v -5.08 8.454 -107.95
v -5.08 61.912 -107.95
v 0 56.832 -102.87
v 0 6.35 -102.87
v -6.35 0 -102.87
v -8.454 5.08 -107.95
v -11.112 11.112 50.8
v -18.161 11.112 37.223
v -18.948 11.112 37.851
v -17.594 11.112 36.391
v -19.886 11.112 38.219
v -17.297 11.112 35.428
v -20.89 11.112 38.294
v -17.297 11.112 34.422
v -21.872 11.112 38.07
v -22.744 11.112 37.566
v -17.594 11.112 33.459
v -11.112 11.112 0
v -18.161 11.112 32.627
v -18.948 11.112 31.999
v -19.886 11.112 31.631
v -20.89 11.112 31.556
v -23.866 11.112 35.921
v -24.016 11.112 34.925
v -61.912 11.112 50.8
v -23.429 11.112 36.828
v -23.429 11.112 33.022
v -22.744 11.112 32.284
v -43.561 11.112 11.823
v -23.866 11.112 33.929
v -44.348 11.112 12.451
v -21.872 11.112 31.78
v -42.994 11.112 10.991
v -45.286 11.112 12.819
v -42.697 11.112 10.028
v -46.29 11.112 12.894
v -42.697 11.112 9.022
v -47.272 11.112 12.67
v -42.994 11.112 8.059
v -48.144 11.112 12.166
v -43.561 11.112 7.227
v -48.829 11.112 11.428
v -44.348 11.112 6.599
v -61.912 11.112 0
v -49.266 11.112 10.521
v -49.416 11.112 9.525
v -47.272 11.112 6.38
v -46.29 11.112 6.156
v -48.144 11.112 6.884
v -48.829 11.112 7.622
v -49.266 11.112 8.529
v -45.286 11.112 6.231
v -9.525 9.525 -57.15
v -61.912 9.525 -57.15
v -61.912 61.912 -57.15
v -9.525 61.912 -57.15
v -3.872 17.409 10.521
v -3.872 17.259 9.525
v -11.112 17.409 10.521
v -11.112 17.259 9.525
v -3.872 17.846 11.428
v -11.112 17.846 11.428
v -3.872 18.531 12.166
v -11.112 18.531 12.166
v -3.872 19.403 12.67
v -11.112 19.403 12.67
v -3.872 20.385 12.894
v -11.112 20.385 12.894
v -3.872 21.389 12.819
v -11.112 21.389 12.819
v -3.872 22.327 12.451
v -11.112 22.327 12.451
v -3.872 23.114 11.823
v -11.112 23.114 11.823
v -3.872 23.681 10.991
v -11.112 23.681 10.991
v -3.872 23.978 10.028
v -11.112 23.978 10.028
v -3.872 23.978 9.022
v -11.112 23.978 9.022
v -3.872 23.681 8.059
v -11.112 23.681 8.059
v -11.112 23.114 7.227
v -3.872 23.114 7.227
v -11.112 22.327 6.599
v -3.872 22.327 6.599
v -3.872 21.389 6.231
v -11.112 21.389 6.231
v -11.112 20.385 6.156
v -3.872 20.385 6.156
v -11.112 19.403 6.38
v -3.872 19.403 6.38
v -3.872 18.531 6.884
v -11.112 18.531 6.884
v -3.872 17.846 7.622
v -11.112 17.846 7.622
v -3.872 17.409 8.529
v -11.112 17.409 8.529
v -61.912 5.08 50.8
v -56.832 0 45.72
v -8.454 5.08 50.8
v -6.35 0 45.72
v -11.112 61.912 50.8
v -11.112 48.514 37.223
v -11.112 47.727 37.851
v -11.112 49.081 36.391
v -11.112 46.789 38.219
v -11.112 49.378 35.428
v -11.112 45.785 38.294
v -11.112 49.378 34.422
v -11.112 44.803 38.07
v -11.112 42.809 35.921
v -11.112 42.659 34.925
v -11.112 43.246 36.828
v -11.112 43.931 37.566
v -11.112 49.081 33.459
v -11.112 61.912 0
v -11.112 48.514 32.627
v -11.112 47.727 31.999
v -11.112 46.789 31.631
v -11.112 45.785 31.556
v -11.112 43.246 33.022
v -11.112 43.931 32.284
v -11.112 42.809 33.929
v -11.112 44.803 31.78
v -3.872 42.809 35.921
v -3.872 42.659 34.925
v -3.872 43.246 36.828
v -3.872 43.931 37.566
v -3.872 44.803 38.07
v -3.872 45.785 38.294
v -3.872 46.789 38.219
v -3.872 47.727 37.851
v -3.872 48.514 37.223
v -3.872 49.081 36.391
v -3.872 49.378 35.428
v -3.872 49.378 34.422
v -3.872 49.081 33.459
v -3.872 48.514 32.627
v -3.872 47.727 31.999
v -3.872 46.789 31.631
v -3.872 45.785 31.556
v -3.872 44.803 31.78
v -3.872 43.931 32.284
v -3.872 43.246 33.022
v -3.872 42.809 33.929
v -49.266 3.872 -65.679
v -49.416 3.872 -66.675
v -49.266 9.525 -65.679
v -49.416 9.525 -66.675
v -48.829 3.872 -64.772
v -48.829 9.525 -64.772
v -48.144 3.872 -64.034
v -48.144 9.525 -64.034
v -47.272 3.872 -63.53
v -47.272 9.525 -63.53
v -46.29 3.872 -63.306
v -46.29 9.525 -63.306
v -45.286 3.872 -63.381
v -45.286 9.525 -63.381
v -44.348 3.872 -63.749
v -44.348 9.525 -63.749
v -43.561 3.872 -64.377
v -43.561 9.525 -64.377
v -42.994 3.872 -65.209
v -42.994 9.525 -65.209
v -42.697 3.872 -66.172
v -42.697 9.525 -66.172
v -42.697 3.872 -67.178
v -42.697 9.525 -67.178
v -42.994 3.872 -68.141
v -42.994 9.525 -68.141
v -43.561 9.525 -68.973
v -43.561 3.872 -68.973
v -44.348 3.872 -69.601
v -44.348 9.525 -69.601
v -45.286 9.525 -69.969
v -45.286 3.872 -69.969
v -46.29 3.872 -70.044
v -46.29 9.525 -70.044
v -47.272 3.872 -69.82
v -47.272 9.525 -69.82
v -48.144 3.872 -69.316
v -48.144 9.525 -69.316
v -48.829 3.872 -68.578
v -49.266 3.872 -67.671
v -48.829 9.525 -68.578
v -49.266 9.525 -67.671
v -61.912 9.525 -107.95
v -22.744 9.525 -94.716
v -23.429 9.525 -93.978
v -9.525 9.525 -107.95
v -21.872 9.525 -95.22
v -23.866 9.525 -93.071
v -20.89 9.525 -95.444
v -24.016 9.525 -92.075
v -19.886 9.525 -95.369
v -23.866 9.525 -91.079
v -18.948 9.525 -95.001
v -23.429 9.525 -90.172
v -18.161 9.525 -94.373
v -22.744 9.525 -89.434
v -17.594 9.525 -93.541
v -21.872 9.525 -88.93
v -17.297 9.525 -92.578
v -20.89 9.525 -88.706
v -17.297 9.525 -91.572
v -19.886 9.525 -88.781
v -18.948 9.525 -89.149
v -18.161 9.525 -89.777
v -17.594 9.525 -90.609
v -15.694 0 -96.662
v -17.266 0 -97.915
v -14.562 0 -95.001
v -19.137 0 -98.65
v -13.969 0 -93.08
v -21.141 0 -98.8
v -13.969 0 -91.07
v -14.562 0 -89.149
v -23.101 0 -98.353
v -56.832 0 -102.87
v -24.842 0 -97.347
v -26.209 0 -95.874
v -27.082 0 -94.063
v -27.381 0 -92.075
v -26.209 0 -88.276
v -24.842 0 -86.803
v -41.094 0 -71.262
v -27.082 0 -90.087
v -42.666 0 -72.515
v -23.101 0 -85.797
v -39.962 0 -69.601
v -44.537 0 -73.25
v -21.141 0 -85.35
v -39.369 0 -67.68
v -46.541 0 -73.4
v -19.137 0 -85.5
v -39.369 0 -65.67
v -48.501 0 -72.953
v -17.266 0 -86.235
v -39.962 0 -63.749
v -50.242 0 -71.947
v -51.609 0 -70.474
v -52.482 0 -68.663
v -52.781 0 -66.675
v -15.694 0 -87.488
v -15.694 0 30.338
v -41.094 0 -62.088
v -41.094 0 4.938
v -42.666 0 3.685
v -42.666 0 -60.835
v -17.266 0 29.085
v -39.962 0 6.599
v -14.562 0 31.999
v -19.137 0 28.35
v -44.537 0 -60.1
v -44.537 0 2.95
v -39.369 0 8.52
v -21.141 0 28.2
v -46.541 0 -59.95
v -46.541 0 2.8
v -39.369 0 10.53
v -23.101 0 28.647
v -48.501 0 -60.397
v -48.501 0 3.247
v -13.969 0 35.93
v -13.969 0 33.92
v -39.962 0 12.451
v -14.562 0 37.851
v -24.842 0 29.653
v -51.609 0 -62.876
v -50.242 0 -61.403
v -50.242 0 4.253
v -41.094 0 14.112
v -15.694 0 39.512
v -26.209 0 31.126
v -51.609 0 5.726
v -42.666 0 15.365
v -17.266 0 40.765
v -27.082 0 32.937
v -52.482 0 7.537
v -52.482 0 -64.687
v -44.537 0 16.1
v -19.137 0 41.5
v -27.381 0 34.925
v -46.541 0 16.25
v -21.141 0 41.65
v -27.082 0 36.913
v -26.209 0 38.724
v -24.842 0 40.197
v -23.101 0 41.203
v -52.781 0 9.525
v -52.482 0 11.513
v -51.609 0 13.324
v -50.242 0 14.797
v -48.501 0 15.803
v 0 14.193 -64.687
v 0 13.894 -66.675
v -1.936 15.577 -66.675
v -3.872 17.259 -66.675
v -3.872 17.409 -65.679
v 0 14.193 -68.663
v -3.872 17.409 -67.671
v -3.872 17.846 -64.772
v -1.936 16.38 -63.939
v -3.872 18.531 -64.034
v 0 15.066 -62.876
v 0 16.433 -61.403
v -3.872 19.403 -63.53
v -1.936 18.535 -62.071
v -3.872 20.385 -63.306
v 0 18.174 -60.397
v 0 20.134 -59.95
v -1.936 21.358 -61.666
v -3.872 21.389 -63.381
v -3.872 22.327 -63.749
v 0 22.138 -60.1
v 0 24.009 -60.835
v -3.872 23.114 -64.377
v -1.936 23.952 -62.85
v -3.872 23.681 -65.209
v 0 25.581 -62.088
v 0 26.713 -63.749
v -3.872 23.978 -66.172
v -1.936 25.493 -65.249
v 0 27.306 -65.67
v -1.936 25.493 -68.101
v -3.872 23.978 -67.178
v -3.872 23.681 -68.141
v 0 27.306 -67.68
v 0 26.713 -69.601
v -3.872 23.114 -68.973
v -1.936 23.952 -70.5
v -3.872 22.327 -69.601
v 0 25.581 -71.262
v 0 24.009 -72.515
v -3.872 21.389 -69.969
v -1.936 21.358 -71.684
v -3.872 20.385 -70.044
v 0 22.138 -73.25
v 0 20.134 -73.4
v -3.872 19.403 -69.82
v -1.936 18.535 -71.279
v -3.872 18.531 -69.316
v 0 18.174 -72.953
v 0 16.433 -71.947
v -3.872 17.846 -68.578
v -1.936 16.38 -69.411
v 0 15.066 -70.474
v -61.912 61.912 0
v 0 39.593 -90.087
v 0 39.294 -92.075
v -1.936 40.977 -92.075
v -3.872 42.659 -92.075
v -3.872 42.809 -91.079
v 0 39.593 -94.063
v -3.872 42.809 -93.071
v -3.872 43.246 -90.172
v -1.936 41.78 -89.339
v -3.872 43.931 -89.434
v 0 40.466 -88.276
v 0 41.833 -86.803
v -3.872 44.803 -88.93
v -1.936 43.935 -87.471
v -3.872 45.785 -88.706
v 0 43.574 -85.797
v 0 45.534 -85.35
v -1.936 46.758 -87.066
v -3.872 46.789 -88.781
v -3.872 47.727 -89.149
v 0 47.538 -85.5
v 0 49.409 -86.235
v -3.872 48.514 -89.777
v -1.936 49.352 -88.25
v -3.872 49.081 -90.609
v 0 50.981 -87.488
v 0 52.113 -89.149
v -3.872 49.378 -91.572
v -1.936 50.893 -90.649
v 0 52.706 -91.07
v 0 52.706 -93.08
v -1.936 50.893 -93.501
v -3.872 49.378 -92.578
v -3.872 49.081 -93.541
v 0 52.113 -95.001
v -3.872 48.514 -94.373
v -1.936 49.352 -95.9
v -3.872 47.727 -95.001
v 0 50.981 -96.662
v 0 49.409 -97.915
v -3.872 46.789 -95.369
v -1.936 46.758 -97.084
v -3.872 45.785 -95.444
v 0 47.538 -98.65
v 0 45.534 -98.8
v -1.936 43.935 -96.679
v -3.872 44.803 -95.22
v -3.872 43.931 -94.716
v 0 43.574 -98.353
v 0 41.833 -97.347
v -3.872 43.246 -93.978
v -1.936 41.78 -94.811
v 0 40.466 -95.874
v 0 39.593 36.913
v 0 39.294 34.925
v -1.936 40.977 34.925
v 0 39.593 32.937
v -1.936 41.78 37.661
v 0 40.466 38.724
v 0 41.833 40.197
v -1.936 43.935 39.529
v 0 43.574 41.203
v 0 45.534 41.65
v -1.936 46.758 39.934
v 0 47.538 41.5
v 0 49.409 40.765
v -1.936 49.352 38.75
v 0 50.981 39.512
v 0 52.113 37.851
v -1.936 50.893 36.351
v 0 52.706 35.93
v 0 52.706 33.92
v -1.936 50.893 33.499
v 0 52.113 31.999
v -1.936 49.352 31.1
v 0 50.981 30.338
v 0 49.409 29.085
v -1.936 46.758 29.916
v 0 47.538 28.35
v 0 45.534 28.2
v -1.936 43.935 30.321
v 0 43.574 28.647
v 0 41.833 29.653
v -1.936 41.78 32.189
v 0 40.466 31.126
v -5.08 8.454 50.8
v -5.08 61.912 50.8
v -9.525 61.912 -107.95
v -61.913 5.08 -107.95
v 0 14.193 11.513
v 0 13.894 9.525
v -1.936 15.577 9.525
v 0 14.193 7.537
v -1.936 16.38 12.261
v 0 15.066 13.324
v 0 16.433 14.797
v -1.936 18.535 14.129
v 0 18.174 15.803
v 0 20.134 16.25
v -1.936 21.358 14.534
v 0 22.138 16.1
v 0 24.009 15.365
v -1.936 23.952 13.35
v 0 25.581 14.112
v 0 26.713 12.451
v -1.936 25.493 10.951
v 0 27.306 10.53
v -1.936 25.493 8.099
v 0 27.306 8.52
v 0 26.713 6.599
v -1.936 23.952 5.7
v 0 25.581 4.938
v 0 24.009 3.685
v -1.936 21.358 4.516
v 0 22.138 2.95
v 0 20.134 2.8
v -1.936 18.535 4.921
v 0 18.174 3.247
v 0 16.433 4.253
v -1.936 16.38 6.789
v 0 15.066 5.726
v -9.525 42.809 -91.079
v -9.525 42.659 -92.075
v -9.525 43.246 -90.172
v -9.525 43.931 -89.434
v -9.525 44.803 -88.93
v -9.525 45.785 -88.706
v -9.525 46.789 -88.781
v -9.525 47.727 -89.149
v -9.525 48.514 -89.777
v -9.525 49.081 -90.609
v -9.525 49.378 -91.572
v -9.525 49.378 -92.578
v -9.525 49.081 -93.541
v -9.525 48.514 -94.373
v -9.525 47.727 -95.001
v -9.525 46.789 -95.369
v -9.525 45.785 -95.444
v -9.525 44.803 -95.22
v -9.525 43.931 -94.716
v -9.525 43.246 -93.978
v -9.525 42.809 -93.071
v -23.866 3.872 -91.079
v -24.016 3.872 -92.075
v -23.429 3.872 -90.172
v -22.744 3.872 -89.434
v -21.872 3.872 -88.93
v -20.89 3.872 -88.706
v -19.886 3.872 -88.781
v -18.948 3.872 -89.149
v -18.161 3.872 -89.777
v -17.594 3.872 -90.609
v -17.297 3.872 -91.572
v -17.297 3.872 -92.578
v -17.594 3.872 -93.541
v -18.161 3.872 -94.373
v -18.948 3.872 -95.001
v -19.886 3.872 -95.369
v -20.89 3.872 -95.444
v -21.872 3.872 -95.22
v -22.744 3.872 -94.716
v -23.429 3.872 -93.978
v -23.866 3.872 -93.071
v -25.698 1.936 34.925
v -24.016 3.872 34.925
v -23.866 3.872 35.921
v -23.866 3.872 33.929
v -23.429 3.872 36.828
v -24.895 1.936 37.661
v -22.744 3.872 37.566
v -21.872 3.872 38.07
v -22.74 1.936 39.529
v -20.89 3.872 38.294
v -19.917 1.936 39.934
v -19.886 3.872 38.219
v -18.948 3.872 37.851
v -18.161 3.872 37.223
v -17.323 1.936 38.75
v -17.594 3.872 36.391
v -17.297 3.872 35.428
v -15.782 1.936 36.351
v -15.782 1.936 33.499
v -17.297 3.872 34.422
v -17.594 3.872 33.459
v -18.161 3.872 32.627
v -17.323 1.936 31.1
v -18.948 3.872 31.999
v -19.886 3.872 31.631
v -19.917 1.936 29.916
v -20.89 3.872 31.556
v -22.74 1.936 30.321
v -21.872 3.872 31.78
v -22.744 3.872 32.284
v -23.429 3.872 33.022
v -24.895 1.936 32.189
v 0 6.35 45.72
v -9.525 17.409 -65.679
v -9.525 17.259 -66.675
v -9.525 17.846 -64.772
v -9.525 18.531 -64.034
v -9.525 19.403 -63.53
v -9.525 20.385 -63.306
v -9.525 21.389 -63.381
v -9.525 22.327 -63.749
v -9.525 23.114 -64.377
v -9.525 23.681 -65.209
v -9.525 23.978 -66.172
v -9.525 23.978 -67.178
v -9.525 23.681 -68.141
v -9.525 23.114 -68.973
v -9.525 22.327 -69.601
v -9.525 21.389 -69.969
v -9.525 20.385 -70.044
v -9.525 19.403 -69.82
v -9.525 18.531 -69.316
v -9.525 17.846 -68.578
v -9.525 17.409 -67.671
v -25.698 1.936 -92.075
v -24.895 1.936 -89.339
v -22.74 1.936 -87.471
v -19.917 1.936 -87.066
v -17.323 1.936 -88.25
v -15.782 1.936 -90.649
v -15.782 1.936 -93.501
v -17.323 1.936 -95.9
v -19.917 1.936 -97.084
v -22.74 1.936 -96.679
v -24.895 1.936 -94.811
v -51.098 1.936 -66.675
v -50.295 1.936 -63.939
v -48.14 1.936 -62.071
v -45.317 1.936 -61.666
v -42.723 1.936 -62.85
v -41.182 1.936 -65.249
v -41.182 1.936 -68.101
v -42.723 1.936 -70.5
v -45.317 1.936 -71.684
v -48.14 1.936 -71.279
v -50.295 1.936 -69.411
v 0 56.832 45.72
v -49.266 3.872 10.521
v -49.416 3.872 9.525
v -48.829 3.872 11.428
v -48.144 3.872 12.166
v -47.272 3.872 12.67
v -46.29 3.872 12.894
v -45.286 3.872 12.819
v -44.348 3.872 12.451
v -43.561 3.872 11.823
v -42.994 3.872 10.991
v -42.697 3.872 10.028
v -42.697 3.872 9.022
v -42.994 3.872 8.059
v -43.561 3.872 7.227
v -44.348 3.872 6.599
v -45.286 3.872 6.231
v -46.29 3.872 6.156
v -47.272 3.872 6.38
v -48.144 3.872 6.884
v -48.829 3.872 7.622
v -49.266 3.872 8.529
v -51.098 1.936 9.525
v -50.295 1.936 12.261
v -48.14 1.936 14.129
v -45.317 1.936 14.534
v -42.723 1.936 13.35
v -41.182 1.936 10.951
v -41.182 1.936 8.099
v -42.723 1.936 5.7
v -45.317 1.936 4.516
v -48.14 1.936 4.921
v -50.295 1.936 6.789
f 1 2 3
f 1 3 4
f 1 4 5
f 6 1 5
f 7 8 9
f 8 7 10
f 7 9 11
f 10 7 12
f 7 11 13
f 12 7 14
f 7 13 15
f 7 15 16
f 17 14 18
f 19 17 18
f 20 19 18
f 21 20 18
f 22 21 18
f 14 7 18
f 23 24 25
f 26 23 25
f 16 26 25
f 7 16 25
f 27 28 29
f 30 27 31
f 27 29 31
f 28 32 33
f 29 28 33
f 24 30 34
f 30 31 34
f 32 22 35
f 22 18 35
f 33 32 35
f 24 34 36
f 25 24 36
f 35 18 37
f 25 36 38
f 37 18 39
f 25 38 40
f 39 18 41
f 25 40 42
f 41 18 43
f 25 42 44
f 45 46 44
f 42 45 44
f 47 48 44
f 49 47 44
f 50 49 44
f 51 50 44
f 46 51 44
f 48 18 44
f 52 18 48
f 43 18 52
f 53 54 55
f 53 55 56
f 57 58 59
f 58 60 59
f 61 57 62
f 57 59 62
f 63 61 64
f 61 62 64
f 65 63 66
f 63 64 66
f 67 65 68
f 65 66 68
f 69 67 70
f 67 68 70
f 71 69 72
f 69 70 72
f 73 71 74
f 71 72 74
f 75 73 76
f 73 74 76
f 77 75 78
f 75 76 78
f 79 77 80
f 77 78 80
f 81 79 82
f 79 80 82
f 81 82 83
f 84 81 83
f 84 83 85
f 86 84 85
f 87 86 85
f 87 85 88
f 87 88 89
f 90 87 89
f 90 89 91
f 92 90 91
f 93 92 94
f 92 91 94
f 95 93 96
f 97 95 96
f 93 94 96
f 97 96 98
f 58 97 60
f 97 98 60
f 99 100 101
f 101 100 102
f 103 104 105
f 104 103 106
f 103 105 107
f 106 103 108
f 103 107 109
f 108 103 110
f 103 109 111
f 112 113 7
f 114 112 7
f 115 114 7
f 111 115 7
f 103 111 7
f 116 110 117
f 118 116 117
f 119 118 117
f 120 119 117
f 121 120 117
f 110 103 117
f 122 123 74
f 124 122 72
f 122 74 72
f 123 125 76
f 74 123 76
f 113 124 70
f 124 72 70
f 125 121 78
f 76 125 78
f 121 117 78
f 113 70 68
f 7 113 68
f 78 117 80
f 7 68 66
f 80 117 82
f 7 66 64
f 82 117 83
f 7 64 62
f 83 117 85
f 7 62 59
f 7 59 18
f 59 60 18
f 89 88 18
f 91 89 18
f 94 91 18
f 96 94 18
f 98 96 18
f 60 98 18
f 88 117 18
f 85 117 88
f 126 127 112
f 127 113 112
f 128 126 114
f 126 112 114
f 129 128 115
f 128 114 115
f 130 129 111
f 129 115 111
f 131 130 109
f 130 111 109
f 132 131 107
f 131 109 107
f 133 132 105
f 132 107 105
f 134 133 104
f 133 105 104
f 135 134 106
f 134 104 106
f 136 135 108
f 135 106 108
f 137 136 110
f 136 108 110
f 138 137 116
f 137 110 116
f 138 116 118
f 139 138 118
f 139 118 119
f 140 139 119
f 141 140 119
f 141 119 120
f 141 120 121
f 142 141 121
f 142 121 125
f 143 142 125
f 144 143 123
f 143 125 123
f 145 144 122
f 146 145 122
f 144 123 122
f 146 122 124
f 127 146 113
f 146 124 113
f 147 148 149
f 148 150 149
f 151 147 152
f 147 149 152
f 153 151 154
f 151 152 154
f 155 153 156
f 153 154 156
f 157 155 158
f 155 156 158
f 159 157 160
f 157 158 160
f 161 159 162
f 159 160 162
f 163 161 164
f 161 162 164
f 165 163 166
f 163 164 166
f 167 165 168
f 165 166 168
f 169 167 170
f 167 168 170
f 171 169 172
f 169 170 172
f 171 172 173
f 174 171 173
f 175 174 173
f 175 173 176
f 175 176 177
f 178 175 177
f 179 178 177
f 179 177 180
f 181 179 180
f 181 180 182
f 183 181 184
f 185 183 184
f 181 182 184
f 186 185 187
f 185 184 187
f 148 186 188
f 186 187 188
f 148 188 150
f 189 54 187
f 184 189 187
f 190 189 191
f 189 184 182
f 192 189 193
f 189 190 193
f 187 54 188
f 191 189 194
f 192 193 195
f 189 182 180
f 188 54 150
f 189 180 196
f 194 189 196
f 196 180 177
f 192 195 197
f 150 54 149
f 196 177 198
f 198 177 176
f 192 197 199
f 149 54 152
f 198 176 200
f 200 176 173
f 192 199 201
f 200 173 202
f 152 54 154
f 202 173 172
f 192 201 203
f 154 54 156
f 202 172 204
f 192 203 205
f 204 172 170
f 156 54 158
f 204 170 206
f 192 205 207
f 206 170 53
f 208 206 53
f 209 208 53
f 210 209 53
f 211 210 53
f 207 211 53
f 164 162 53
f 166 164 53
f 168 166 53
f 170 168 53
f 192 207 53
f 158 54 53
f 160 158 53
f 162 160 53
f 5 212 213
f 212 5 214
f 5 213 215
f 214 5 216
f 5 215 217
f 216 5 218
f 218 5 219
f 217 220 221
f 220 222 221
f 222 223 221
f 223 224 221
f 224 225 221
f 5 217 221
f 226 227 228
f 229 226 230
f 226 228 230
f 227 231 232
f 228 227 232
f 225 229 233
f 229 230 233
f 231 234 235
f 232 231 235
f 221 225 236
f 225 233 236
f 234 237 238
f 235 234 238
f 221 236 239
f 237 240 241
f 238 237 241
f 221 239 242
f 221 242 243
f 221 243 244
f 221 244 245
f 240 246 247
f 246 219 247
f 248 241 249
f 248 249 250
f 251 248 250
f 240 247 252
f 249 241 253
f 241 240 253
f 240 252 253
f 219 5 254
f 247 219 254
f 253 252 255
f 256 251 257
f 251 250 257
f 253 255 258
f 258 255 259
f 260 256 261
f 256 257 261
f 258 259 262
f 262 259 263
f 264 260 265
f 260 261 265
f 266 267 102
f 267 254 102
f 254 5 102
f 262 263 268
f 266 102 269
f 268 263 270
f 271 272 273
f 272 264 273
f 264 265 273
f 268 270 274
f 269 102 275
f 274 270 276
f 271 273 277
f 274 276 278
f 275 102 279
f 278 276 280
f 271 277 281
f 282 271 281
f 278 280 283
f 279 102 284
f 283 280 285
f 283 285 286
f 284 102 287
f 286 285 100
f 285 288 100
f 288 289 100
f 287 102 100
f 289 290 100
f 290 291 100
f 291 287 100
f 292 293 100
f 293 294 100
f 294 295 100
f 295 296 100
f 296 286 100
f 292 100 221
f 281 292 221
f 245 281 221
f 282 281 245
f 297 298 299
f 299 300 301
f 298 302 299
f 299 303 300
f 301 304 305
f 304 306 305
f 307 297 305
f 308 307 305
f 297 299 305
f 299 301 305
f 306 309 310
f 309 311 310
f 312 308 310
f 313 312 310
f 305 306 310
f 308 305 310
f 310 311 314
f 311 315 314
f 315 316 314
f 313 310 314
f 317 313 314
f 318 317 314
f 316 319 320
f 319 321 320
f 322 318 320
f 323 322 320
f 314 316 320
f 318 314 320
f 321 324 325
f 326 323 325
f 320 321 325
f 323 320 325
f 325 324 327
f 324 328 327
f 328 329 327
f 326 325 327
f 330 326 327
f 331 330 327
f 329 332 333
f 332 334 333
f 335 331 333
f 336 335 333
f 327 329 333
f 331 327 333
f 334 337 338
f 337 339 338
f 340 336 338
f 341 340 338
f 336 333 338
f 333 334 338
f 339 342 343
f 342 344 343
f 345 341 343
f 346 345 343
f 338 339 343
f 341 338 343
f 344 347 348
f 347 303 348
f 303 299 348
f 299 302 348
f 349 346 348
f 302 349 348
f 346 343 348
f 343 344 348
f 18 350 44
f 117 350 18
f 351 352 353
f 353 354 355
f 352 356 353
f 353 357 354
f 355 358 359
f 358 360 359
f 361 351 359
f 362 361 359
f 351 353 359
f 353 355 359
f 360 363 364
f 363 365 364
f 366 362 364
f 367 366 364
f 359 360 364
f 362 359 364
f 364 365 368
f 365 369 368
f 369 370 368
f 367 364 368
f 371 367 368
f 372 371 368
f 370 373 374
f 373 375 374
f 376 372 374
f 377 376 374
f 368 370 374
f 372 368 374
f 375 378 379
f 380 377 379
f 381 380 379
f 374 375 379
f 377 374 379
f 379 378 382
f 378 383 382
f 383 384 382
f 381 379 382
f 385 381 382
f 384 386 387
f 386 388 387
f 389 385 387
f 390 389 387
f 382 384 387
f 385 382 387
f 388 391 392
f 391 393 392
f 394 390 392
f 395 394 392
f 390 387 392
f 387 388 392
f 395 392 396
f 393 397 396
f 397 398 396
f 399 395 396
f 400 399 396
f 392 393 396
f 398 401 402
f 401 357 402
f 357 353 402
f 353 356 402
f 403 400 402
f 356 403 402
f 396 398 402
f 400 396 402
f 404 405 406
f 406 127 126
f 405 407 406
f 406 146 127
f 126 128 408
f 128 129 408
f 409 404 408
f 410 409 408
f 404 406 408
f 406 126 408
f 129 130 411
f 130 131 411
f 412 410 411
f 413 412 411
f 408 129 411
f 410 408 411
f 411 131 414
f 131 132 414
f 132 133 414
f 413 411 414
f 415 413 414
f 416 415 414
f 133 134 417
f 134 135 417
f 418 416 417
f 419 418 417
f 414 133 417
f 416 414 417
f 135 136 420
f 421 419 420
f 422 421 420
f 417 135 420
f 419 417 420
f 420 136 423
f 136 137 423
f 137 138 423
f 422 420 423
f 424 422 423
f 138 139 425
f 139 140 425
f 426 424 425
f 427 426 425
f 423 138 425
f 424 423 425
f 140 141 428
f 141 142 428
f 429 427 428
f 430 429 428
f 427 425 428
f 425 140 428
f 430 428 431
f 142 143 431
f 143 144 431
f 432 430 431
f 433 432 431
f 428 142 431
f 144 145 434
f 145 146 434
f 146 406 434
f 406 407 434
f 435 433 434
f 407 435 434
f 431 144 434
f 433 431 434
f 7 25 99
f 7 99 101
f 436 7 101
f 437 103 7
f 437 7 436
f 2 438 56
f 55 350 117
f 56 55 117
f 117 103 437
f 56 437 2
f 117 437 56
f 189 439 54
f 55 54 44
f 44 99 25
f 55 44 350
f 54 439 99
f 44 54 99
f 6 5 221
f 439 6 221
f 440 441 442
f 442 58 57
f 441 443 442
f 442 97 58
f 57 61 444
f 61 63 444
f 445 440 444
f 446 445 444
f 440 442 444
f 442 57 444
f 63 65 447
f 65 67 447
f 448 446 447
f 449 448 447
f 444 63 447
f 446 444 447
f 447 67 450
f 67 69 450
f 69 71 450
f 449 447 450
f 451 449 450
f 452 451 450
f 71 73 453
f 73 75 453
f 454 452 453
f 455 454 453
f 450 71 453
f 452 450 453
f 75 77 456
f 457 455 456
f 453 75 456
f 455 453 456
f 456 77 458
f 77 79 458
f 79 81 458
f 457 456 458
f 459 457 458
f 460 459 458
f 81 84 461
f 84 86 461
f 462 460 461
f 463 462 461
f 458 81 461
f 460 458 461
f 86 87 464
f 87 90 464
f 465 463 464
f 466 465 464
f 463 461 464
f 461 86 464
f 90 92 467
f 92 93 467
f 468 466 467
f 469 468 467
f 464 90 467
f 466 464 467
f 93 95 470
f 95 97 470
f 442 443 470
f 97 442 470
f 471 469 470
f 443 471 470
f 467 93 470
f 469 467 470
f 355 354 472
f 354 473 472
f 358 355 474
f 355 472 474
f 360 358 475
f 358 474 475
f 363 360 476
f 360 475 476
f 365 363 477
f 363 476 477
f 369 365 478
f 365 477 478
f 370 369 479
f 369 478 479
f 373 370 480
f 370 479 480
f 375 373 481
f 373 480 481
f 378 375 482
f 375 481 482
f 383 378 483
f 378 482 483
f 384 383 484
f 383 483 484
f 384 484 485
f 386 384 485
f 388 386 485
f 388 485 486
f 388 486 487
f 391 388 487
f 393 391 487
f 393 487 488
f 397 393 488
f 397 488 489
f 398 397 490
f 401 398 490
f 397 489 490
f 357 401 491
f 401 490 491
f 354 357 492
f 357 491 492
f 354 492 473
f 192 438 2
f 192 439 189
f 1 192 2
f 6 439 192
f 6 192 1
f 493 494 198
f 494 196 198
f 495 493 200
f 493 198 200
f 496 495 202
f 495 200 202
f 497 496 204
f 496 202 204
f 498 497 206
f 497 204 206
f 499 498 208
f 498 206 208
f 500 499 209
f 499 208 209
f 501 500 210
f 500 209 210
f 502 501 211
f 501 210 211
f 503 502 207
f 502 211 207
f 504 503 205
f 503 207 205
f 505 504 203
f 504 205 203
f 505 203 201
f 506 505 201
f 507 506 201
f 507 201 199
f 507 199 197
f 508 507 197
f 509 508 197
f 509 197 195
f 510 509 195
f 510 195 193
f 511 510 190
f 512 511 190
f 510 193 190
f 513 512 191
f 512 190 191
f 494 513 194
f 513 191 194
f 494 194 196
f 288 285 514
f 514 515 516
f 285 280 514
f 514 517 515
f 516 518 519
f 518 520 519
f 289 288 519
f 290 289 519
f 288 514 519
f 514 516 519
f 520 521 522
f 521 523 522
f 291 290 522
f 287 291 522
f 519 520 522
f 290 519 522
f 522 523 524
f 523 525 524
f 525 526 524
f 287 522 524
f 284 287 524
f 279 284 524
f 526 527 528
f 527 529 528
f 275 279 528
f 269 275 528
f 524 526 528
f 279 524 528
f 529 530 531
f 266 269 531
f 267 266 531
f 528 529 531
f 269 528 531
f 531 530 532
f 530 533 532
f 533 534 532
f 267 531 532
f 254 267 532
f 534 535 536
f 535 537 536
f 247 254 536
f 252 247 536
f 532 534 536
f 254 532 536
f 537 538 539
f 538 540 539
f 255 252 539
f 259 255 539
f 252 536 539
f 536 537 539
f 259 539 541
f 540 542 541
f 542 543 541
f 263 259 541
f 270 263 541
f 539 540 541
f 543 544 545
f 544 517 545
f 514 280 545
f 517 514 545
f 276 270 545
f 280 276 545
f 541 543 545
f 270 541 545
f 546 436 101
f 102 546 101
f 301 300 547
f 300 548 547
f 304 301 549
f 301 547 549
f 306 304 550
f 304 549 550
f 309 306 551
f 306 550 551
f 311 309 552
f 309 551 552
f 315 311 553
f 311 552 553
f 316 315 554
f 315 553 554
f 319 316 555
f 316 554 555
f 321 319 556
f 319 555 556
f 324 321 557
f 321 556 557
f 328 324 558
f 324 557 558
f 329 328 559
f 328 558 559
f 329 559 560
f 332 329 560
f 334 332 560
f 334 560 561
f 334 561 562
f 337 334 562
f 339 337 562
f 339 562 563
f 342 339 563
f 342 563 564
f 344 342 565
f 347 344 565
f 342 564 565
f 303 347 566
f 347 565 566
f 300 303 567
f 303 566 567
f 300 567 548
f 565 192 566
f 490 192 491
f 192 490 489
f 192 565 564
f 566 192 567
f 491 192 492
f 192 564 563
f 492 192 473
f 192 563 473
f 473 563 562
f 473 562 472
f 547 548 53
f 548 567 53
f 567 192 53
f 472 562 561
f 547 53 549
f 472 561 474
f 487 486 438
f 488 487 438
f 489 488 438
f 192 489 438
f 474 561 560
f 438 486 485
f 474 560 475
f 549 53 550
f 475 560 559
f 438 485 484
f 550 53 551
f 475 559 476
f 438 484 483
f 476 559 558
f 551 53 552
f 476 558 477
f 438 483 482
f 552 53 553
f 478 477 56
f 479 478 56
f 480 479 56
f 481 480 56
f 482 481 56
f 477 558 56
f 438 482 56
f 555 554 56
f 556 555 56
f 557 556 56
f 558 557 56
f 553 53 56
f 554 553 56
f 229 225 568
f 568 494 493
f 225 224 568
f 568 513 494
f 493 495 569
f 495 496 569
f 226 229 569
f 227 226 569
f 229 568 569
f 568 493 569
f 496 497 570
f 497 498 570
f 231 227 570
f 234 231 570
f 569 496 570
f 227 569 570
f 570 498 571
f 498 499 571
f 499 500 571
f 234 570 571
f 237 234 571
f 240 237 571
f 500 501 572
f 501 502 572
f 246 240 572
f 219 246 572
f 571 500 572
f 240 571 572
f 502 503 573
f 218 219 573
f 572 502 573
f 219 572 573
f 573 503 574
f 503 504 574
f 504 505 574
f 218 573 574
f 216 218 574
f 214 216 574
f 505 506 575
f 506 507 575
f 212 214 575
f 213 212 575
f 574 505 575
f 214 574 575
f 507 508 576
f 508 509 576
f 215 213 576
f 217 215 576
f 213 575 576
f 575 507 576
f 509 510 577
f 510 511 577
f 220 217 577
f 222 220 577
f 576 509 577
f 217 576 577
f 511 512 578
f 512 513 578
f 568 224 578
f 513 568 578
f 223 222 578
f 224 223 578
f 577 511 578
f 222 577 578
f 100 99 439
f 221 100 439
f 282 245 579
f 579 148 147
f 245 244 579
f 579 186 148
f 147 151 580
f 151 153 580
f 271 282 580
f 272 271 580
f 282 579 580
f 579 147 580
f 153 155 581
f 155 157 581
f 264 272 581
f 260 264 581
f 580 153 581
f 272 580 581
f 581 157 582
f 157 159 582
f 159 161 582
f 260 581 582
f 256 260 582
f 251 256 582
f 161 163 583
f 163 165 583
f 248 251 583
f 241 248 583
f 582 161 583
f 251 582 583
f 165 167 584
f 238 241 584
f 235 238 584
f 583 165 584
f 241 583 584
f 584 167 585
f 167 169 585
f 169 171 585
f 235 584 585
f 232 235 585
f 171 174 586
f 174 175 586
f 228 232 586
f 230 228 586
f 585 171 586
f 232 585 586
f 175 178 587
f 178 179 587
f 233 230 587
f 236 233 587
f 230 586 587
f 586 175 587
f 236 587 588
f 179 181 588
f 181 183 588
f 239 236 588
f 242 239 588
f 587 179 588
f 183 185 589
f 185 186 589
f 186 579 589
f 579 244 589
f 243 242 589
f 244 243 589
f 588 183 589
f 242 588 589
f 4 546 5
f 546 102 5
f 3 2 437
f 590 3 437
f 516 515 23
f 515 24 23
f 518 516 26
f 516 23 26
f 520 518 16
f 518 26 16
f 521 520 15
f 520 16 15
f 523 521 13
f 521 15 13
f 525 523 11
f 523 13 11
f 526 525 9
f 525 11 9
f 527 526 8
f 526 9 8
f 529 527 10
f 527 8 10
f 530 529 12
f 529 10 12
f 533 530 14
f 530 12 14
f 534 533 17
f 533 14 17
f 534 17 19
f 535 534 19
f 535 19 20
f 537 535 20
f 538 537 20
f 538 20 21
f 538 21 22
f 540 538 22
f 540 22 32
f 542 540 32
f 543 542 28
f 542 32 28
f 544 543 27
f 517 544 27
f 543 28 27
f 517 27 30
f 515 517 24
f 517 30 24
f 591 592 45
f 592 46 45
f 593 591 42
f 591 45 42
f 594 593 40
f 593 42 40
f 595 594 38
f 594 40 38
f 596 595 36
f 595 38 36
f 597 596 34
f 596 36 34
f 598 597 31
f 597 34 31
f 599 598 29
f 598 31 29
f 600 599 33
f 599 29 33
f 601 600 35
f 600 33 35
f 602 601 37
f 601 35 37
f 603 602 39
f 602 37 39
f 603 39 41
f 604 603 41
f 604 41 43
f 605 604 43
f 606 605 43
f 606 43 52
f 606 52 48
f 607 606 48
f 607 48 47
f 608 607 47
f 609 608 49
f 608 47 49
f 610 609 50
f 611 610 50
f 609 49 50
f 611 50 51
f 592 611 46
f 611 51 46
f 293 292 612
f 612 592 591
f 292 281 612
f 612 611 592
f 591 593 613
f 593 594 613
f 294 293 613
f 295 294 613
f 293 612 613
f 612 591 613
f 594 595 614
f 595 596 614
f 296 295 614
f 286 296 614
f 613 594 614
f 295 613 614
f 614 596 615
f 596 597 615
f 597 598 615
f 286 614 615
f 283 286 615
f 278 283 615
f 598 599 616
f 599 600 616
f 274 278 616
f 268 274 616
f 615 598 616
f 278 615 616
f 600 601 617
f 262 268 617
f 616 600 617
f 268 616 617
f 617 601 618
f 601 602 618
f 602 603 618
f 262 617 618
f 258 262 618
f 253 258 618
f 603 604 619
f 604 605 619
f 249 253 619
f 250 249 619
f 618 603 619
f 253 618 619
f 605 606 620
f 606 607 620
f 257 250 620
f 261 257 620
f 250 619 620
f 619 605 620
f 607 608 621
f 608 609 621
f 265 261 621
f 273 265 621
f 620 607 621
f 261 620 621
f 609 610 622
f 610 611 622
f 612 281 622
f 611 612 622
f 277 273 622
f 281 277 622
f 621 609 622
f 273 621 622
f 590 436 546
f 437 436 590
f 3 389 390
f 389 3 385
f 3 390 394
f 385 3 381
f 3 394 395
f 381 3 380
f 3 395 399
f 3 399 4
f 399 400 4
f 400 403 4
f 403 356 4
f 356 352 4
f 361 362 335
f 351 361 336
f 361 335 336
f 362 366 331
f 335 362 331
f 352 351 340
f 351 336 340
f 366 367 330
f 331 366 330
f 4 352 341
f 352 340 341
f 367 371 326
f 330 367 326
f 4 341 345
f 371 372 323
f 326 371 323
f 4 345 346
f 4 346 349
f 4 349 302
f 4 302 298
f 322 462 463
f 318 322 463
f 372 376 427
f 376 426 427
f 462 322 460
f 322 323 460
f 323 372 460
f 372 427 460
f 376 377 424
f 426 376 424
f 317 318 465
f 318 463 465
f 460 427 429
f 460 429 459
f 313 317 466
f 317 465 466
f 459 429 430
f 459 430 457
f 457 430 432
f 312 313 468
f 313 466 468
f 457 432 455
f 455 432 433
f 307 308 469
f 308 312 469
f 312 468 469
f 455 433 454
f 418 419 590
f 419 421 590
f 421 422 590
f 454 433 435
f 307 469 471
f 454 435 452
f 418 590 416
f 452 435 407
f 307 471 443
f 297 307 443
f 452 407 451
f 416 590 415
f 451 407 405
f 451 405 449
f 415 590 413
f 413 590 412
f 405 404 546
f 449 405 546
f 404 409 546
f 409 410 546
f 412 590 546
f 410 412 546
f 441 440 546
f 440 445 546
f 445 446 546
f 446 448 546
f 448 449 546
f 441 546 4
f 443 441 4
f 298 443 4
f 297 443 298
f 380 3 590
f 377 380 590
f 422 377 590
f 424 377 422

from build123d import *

# Parameters (mm, degrees)
F1_DEPTH             = 50.8
F2_W                 = 61.9125
F2_H                 = 61.9125
F3_DEPTH             = 57.15
F5_DEPTH             = 50.8
F8_D                 = 6.7564
F8_CSINK_D           = 13.4874
F8_CSINK_ANGLE       = 82
F8_ON_F7_D           = 6.7564
F8_ON_F7_CSINK_D     = 13.4874
F8_ON_F7_CSINK_ANGLE = 82
F9_SIZE              = 6.35
F11_SIZE             = 5.08


# Not quite as in the source:
# - a feature of the source that left no trace in its solid (it failed there, or was rolled back) is left out
# - a feature names something its author has since deleted; it is built from what else it names


with BuildPart() as f1:
    # F0 (on Top) → F1 (new body)
    with BuildSketch(Plane.XY):
        Polygon((-61.9125, 0), (0, 0), (0, 61.9125), (-11.1125, 61.9125), (-11.1125, 11.1125), (-61.9125, 11.1125), align=None)
    extrude(amount=F1_DEPTH)

    # F2 (on Top) → F3 (join)
    with BuildSketch(Plane.XY):
        with Locations((-30.95625, 30.95625)):
            Rectangle(F2_W, F2_H)
    extrude(amount=-F3_DEPTH)

    # F4 (on face) → F5 (join)
    with BuildSketch(Plane(origin=(0, 0, -57.15), x_dir=(1, 0, 0), z_dir=(0, 0, -1))):
        Polygon((0, -61.9125), (0, 0), (-61.9125, 0), (-61.9125, -9.525), (-9.525, -9.525), (-9.525, -61.9125), align=None)
    extrude(amount=F5_DEPTH)

    # F8 (through all)
    with Locations(Plane.YZ):
        with Locations((46.0375, 34.925), (20.6375, 9.525), (20.6375, -66.675), (46.0375, -92.075)):
            CounterSinkHole(F8_D / 2, F8_CSINK_D / 2, counter_sink_angle=F8_CSINK_ANGLE)

    # F8 on F7 (through all)
    with Locations(Plane.XZ):
        with Locations((-20.6375, 34.925), (-46.0375, 9.525), (-46.0375, -66.675), (-20.6375, -92.075)):
            CounterSinkHole(F8_ON_F7_D / 2, F8_ON_F7_CSINK_D / 2, counter_sink_angle=F8_ON_F7_CSINK_ANGLE)

    # F9
    f9_edges = [f1.edges().sort_by_distance(p)[0] for p in [
        (0, 0, -28.575),
    ]]
    chamfer(f9_edges, length=F9_SIZE)

    # F11
    f11_edges = [f1.edges().sort_by_distance(p)[0] for p in [
        (-34.13125, 0, 50.8),
        (-3.175, 3.175, 50.8),
        (0, 34.13125, 50.8),
        (-3.175, 3.175, -107.95),
        (-34.13125, 0, -107.95),
        (0, 34.13125, -107.95),
        (-61.9125, 0, -28.575),
        (0, 61.9125, -28.575),
    ]]
    chamfer(f11_edges, length=F11_SIZE)


solid = f1.part
